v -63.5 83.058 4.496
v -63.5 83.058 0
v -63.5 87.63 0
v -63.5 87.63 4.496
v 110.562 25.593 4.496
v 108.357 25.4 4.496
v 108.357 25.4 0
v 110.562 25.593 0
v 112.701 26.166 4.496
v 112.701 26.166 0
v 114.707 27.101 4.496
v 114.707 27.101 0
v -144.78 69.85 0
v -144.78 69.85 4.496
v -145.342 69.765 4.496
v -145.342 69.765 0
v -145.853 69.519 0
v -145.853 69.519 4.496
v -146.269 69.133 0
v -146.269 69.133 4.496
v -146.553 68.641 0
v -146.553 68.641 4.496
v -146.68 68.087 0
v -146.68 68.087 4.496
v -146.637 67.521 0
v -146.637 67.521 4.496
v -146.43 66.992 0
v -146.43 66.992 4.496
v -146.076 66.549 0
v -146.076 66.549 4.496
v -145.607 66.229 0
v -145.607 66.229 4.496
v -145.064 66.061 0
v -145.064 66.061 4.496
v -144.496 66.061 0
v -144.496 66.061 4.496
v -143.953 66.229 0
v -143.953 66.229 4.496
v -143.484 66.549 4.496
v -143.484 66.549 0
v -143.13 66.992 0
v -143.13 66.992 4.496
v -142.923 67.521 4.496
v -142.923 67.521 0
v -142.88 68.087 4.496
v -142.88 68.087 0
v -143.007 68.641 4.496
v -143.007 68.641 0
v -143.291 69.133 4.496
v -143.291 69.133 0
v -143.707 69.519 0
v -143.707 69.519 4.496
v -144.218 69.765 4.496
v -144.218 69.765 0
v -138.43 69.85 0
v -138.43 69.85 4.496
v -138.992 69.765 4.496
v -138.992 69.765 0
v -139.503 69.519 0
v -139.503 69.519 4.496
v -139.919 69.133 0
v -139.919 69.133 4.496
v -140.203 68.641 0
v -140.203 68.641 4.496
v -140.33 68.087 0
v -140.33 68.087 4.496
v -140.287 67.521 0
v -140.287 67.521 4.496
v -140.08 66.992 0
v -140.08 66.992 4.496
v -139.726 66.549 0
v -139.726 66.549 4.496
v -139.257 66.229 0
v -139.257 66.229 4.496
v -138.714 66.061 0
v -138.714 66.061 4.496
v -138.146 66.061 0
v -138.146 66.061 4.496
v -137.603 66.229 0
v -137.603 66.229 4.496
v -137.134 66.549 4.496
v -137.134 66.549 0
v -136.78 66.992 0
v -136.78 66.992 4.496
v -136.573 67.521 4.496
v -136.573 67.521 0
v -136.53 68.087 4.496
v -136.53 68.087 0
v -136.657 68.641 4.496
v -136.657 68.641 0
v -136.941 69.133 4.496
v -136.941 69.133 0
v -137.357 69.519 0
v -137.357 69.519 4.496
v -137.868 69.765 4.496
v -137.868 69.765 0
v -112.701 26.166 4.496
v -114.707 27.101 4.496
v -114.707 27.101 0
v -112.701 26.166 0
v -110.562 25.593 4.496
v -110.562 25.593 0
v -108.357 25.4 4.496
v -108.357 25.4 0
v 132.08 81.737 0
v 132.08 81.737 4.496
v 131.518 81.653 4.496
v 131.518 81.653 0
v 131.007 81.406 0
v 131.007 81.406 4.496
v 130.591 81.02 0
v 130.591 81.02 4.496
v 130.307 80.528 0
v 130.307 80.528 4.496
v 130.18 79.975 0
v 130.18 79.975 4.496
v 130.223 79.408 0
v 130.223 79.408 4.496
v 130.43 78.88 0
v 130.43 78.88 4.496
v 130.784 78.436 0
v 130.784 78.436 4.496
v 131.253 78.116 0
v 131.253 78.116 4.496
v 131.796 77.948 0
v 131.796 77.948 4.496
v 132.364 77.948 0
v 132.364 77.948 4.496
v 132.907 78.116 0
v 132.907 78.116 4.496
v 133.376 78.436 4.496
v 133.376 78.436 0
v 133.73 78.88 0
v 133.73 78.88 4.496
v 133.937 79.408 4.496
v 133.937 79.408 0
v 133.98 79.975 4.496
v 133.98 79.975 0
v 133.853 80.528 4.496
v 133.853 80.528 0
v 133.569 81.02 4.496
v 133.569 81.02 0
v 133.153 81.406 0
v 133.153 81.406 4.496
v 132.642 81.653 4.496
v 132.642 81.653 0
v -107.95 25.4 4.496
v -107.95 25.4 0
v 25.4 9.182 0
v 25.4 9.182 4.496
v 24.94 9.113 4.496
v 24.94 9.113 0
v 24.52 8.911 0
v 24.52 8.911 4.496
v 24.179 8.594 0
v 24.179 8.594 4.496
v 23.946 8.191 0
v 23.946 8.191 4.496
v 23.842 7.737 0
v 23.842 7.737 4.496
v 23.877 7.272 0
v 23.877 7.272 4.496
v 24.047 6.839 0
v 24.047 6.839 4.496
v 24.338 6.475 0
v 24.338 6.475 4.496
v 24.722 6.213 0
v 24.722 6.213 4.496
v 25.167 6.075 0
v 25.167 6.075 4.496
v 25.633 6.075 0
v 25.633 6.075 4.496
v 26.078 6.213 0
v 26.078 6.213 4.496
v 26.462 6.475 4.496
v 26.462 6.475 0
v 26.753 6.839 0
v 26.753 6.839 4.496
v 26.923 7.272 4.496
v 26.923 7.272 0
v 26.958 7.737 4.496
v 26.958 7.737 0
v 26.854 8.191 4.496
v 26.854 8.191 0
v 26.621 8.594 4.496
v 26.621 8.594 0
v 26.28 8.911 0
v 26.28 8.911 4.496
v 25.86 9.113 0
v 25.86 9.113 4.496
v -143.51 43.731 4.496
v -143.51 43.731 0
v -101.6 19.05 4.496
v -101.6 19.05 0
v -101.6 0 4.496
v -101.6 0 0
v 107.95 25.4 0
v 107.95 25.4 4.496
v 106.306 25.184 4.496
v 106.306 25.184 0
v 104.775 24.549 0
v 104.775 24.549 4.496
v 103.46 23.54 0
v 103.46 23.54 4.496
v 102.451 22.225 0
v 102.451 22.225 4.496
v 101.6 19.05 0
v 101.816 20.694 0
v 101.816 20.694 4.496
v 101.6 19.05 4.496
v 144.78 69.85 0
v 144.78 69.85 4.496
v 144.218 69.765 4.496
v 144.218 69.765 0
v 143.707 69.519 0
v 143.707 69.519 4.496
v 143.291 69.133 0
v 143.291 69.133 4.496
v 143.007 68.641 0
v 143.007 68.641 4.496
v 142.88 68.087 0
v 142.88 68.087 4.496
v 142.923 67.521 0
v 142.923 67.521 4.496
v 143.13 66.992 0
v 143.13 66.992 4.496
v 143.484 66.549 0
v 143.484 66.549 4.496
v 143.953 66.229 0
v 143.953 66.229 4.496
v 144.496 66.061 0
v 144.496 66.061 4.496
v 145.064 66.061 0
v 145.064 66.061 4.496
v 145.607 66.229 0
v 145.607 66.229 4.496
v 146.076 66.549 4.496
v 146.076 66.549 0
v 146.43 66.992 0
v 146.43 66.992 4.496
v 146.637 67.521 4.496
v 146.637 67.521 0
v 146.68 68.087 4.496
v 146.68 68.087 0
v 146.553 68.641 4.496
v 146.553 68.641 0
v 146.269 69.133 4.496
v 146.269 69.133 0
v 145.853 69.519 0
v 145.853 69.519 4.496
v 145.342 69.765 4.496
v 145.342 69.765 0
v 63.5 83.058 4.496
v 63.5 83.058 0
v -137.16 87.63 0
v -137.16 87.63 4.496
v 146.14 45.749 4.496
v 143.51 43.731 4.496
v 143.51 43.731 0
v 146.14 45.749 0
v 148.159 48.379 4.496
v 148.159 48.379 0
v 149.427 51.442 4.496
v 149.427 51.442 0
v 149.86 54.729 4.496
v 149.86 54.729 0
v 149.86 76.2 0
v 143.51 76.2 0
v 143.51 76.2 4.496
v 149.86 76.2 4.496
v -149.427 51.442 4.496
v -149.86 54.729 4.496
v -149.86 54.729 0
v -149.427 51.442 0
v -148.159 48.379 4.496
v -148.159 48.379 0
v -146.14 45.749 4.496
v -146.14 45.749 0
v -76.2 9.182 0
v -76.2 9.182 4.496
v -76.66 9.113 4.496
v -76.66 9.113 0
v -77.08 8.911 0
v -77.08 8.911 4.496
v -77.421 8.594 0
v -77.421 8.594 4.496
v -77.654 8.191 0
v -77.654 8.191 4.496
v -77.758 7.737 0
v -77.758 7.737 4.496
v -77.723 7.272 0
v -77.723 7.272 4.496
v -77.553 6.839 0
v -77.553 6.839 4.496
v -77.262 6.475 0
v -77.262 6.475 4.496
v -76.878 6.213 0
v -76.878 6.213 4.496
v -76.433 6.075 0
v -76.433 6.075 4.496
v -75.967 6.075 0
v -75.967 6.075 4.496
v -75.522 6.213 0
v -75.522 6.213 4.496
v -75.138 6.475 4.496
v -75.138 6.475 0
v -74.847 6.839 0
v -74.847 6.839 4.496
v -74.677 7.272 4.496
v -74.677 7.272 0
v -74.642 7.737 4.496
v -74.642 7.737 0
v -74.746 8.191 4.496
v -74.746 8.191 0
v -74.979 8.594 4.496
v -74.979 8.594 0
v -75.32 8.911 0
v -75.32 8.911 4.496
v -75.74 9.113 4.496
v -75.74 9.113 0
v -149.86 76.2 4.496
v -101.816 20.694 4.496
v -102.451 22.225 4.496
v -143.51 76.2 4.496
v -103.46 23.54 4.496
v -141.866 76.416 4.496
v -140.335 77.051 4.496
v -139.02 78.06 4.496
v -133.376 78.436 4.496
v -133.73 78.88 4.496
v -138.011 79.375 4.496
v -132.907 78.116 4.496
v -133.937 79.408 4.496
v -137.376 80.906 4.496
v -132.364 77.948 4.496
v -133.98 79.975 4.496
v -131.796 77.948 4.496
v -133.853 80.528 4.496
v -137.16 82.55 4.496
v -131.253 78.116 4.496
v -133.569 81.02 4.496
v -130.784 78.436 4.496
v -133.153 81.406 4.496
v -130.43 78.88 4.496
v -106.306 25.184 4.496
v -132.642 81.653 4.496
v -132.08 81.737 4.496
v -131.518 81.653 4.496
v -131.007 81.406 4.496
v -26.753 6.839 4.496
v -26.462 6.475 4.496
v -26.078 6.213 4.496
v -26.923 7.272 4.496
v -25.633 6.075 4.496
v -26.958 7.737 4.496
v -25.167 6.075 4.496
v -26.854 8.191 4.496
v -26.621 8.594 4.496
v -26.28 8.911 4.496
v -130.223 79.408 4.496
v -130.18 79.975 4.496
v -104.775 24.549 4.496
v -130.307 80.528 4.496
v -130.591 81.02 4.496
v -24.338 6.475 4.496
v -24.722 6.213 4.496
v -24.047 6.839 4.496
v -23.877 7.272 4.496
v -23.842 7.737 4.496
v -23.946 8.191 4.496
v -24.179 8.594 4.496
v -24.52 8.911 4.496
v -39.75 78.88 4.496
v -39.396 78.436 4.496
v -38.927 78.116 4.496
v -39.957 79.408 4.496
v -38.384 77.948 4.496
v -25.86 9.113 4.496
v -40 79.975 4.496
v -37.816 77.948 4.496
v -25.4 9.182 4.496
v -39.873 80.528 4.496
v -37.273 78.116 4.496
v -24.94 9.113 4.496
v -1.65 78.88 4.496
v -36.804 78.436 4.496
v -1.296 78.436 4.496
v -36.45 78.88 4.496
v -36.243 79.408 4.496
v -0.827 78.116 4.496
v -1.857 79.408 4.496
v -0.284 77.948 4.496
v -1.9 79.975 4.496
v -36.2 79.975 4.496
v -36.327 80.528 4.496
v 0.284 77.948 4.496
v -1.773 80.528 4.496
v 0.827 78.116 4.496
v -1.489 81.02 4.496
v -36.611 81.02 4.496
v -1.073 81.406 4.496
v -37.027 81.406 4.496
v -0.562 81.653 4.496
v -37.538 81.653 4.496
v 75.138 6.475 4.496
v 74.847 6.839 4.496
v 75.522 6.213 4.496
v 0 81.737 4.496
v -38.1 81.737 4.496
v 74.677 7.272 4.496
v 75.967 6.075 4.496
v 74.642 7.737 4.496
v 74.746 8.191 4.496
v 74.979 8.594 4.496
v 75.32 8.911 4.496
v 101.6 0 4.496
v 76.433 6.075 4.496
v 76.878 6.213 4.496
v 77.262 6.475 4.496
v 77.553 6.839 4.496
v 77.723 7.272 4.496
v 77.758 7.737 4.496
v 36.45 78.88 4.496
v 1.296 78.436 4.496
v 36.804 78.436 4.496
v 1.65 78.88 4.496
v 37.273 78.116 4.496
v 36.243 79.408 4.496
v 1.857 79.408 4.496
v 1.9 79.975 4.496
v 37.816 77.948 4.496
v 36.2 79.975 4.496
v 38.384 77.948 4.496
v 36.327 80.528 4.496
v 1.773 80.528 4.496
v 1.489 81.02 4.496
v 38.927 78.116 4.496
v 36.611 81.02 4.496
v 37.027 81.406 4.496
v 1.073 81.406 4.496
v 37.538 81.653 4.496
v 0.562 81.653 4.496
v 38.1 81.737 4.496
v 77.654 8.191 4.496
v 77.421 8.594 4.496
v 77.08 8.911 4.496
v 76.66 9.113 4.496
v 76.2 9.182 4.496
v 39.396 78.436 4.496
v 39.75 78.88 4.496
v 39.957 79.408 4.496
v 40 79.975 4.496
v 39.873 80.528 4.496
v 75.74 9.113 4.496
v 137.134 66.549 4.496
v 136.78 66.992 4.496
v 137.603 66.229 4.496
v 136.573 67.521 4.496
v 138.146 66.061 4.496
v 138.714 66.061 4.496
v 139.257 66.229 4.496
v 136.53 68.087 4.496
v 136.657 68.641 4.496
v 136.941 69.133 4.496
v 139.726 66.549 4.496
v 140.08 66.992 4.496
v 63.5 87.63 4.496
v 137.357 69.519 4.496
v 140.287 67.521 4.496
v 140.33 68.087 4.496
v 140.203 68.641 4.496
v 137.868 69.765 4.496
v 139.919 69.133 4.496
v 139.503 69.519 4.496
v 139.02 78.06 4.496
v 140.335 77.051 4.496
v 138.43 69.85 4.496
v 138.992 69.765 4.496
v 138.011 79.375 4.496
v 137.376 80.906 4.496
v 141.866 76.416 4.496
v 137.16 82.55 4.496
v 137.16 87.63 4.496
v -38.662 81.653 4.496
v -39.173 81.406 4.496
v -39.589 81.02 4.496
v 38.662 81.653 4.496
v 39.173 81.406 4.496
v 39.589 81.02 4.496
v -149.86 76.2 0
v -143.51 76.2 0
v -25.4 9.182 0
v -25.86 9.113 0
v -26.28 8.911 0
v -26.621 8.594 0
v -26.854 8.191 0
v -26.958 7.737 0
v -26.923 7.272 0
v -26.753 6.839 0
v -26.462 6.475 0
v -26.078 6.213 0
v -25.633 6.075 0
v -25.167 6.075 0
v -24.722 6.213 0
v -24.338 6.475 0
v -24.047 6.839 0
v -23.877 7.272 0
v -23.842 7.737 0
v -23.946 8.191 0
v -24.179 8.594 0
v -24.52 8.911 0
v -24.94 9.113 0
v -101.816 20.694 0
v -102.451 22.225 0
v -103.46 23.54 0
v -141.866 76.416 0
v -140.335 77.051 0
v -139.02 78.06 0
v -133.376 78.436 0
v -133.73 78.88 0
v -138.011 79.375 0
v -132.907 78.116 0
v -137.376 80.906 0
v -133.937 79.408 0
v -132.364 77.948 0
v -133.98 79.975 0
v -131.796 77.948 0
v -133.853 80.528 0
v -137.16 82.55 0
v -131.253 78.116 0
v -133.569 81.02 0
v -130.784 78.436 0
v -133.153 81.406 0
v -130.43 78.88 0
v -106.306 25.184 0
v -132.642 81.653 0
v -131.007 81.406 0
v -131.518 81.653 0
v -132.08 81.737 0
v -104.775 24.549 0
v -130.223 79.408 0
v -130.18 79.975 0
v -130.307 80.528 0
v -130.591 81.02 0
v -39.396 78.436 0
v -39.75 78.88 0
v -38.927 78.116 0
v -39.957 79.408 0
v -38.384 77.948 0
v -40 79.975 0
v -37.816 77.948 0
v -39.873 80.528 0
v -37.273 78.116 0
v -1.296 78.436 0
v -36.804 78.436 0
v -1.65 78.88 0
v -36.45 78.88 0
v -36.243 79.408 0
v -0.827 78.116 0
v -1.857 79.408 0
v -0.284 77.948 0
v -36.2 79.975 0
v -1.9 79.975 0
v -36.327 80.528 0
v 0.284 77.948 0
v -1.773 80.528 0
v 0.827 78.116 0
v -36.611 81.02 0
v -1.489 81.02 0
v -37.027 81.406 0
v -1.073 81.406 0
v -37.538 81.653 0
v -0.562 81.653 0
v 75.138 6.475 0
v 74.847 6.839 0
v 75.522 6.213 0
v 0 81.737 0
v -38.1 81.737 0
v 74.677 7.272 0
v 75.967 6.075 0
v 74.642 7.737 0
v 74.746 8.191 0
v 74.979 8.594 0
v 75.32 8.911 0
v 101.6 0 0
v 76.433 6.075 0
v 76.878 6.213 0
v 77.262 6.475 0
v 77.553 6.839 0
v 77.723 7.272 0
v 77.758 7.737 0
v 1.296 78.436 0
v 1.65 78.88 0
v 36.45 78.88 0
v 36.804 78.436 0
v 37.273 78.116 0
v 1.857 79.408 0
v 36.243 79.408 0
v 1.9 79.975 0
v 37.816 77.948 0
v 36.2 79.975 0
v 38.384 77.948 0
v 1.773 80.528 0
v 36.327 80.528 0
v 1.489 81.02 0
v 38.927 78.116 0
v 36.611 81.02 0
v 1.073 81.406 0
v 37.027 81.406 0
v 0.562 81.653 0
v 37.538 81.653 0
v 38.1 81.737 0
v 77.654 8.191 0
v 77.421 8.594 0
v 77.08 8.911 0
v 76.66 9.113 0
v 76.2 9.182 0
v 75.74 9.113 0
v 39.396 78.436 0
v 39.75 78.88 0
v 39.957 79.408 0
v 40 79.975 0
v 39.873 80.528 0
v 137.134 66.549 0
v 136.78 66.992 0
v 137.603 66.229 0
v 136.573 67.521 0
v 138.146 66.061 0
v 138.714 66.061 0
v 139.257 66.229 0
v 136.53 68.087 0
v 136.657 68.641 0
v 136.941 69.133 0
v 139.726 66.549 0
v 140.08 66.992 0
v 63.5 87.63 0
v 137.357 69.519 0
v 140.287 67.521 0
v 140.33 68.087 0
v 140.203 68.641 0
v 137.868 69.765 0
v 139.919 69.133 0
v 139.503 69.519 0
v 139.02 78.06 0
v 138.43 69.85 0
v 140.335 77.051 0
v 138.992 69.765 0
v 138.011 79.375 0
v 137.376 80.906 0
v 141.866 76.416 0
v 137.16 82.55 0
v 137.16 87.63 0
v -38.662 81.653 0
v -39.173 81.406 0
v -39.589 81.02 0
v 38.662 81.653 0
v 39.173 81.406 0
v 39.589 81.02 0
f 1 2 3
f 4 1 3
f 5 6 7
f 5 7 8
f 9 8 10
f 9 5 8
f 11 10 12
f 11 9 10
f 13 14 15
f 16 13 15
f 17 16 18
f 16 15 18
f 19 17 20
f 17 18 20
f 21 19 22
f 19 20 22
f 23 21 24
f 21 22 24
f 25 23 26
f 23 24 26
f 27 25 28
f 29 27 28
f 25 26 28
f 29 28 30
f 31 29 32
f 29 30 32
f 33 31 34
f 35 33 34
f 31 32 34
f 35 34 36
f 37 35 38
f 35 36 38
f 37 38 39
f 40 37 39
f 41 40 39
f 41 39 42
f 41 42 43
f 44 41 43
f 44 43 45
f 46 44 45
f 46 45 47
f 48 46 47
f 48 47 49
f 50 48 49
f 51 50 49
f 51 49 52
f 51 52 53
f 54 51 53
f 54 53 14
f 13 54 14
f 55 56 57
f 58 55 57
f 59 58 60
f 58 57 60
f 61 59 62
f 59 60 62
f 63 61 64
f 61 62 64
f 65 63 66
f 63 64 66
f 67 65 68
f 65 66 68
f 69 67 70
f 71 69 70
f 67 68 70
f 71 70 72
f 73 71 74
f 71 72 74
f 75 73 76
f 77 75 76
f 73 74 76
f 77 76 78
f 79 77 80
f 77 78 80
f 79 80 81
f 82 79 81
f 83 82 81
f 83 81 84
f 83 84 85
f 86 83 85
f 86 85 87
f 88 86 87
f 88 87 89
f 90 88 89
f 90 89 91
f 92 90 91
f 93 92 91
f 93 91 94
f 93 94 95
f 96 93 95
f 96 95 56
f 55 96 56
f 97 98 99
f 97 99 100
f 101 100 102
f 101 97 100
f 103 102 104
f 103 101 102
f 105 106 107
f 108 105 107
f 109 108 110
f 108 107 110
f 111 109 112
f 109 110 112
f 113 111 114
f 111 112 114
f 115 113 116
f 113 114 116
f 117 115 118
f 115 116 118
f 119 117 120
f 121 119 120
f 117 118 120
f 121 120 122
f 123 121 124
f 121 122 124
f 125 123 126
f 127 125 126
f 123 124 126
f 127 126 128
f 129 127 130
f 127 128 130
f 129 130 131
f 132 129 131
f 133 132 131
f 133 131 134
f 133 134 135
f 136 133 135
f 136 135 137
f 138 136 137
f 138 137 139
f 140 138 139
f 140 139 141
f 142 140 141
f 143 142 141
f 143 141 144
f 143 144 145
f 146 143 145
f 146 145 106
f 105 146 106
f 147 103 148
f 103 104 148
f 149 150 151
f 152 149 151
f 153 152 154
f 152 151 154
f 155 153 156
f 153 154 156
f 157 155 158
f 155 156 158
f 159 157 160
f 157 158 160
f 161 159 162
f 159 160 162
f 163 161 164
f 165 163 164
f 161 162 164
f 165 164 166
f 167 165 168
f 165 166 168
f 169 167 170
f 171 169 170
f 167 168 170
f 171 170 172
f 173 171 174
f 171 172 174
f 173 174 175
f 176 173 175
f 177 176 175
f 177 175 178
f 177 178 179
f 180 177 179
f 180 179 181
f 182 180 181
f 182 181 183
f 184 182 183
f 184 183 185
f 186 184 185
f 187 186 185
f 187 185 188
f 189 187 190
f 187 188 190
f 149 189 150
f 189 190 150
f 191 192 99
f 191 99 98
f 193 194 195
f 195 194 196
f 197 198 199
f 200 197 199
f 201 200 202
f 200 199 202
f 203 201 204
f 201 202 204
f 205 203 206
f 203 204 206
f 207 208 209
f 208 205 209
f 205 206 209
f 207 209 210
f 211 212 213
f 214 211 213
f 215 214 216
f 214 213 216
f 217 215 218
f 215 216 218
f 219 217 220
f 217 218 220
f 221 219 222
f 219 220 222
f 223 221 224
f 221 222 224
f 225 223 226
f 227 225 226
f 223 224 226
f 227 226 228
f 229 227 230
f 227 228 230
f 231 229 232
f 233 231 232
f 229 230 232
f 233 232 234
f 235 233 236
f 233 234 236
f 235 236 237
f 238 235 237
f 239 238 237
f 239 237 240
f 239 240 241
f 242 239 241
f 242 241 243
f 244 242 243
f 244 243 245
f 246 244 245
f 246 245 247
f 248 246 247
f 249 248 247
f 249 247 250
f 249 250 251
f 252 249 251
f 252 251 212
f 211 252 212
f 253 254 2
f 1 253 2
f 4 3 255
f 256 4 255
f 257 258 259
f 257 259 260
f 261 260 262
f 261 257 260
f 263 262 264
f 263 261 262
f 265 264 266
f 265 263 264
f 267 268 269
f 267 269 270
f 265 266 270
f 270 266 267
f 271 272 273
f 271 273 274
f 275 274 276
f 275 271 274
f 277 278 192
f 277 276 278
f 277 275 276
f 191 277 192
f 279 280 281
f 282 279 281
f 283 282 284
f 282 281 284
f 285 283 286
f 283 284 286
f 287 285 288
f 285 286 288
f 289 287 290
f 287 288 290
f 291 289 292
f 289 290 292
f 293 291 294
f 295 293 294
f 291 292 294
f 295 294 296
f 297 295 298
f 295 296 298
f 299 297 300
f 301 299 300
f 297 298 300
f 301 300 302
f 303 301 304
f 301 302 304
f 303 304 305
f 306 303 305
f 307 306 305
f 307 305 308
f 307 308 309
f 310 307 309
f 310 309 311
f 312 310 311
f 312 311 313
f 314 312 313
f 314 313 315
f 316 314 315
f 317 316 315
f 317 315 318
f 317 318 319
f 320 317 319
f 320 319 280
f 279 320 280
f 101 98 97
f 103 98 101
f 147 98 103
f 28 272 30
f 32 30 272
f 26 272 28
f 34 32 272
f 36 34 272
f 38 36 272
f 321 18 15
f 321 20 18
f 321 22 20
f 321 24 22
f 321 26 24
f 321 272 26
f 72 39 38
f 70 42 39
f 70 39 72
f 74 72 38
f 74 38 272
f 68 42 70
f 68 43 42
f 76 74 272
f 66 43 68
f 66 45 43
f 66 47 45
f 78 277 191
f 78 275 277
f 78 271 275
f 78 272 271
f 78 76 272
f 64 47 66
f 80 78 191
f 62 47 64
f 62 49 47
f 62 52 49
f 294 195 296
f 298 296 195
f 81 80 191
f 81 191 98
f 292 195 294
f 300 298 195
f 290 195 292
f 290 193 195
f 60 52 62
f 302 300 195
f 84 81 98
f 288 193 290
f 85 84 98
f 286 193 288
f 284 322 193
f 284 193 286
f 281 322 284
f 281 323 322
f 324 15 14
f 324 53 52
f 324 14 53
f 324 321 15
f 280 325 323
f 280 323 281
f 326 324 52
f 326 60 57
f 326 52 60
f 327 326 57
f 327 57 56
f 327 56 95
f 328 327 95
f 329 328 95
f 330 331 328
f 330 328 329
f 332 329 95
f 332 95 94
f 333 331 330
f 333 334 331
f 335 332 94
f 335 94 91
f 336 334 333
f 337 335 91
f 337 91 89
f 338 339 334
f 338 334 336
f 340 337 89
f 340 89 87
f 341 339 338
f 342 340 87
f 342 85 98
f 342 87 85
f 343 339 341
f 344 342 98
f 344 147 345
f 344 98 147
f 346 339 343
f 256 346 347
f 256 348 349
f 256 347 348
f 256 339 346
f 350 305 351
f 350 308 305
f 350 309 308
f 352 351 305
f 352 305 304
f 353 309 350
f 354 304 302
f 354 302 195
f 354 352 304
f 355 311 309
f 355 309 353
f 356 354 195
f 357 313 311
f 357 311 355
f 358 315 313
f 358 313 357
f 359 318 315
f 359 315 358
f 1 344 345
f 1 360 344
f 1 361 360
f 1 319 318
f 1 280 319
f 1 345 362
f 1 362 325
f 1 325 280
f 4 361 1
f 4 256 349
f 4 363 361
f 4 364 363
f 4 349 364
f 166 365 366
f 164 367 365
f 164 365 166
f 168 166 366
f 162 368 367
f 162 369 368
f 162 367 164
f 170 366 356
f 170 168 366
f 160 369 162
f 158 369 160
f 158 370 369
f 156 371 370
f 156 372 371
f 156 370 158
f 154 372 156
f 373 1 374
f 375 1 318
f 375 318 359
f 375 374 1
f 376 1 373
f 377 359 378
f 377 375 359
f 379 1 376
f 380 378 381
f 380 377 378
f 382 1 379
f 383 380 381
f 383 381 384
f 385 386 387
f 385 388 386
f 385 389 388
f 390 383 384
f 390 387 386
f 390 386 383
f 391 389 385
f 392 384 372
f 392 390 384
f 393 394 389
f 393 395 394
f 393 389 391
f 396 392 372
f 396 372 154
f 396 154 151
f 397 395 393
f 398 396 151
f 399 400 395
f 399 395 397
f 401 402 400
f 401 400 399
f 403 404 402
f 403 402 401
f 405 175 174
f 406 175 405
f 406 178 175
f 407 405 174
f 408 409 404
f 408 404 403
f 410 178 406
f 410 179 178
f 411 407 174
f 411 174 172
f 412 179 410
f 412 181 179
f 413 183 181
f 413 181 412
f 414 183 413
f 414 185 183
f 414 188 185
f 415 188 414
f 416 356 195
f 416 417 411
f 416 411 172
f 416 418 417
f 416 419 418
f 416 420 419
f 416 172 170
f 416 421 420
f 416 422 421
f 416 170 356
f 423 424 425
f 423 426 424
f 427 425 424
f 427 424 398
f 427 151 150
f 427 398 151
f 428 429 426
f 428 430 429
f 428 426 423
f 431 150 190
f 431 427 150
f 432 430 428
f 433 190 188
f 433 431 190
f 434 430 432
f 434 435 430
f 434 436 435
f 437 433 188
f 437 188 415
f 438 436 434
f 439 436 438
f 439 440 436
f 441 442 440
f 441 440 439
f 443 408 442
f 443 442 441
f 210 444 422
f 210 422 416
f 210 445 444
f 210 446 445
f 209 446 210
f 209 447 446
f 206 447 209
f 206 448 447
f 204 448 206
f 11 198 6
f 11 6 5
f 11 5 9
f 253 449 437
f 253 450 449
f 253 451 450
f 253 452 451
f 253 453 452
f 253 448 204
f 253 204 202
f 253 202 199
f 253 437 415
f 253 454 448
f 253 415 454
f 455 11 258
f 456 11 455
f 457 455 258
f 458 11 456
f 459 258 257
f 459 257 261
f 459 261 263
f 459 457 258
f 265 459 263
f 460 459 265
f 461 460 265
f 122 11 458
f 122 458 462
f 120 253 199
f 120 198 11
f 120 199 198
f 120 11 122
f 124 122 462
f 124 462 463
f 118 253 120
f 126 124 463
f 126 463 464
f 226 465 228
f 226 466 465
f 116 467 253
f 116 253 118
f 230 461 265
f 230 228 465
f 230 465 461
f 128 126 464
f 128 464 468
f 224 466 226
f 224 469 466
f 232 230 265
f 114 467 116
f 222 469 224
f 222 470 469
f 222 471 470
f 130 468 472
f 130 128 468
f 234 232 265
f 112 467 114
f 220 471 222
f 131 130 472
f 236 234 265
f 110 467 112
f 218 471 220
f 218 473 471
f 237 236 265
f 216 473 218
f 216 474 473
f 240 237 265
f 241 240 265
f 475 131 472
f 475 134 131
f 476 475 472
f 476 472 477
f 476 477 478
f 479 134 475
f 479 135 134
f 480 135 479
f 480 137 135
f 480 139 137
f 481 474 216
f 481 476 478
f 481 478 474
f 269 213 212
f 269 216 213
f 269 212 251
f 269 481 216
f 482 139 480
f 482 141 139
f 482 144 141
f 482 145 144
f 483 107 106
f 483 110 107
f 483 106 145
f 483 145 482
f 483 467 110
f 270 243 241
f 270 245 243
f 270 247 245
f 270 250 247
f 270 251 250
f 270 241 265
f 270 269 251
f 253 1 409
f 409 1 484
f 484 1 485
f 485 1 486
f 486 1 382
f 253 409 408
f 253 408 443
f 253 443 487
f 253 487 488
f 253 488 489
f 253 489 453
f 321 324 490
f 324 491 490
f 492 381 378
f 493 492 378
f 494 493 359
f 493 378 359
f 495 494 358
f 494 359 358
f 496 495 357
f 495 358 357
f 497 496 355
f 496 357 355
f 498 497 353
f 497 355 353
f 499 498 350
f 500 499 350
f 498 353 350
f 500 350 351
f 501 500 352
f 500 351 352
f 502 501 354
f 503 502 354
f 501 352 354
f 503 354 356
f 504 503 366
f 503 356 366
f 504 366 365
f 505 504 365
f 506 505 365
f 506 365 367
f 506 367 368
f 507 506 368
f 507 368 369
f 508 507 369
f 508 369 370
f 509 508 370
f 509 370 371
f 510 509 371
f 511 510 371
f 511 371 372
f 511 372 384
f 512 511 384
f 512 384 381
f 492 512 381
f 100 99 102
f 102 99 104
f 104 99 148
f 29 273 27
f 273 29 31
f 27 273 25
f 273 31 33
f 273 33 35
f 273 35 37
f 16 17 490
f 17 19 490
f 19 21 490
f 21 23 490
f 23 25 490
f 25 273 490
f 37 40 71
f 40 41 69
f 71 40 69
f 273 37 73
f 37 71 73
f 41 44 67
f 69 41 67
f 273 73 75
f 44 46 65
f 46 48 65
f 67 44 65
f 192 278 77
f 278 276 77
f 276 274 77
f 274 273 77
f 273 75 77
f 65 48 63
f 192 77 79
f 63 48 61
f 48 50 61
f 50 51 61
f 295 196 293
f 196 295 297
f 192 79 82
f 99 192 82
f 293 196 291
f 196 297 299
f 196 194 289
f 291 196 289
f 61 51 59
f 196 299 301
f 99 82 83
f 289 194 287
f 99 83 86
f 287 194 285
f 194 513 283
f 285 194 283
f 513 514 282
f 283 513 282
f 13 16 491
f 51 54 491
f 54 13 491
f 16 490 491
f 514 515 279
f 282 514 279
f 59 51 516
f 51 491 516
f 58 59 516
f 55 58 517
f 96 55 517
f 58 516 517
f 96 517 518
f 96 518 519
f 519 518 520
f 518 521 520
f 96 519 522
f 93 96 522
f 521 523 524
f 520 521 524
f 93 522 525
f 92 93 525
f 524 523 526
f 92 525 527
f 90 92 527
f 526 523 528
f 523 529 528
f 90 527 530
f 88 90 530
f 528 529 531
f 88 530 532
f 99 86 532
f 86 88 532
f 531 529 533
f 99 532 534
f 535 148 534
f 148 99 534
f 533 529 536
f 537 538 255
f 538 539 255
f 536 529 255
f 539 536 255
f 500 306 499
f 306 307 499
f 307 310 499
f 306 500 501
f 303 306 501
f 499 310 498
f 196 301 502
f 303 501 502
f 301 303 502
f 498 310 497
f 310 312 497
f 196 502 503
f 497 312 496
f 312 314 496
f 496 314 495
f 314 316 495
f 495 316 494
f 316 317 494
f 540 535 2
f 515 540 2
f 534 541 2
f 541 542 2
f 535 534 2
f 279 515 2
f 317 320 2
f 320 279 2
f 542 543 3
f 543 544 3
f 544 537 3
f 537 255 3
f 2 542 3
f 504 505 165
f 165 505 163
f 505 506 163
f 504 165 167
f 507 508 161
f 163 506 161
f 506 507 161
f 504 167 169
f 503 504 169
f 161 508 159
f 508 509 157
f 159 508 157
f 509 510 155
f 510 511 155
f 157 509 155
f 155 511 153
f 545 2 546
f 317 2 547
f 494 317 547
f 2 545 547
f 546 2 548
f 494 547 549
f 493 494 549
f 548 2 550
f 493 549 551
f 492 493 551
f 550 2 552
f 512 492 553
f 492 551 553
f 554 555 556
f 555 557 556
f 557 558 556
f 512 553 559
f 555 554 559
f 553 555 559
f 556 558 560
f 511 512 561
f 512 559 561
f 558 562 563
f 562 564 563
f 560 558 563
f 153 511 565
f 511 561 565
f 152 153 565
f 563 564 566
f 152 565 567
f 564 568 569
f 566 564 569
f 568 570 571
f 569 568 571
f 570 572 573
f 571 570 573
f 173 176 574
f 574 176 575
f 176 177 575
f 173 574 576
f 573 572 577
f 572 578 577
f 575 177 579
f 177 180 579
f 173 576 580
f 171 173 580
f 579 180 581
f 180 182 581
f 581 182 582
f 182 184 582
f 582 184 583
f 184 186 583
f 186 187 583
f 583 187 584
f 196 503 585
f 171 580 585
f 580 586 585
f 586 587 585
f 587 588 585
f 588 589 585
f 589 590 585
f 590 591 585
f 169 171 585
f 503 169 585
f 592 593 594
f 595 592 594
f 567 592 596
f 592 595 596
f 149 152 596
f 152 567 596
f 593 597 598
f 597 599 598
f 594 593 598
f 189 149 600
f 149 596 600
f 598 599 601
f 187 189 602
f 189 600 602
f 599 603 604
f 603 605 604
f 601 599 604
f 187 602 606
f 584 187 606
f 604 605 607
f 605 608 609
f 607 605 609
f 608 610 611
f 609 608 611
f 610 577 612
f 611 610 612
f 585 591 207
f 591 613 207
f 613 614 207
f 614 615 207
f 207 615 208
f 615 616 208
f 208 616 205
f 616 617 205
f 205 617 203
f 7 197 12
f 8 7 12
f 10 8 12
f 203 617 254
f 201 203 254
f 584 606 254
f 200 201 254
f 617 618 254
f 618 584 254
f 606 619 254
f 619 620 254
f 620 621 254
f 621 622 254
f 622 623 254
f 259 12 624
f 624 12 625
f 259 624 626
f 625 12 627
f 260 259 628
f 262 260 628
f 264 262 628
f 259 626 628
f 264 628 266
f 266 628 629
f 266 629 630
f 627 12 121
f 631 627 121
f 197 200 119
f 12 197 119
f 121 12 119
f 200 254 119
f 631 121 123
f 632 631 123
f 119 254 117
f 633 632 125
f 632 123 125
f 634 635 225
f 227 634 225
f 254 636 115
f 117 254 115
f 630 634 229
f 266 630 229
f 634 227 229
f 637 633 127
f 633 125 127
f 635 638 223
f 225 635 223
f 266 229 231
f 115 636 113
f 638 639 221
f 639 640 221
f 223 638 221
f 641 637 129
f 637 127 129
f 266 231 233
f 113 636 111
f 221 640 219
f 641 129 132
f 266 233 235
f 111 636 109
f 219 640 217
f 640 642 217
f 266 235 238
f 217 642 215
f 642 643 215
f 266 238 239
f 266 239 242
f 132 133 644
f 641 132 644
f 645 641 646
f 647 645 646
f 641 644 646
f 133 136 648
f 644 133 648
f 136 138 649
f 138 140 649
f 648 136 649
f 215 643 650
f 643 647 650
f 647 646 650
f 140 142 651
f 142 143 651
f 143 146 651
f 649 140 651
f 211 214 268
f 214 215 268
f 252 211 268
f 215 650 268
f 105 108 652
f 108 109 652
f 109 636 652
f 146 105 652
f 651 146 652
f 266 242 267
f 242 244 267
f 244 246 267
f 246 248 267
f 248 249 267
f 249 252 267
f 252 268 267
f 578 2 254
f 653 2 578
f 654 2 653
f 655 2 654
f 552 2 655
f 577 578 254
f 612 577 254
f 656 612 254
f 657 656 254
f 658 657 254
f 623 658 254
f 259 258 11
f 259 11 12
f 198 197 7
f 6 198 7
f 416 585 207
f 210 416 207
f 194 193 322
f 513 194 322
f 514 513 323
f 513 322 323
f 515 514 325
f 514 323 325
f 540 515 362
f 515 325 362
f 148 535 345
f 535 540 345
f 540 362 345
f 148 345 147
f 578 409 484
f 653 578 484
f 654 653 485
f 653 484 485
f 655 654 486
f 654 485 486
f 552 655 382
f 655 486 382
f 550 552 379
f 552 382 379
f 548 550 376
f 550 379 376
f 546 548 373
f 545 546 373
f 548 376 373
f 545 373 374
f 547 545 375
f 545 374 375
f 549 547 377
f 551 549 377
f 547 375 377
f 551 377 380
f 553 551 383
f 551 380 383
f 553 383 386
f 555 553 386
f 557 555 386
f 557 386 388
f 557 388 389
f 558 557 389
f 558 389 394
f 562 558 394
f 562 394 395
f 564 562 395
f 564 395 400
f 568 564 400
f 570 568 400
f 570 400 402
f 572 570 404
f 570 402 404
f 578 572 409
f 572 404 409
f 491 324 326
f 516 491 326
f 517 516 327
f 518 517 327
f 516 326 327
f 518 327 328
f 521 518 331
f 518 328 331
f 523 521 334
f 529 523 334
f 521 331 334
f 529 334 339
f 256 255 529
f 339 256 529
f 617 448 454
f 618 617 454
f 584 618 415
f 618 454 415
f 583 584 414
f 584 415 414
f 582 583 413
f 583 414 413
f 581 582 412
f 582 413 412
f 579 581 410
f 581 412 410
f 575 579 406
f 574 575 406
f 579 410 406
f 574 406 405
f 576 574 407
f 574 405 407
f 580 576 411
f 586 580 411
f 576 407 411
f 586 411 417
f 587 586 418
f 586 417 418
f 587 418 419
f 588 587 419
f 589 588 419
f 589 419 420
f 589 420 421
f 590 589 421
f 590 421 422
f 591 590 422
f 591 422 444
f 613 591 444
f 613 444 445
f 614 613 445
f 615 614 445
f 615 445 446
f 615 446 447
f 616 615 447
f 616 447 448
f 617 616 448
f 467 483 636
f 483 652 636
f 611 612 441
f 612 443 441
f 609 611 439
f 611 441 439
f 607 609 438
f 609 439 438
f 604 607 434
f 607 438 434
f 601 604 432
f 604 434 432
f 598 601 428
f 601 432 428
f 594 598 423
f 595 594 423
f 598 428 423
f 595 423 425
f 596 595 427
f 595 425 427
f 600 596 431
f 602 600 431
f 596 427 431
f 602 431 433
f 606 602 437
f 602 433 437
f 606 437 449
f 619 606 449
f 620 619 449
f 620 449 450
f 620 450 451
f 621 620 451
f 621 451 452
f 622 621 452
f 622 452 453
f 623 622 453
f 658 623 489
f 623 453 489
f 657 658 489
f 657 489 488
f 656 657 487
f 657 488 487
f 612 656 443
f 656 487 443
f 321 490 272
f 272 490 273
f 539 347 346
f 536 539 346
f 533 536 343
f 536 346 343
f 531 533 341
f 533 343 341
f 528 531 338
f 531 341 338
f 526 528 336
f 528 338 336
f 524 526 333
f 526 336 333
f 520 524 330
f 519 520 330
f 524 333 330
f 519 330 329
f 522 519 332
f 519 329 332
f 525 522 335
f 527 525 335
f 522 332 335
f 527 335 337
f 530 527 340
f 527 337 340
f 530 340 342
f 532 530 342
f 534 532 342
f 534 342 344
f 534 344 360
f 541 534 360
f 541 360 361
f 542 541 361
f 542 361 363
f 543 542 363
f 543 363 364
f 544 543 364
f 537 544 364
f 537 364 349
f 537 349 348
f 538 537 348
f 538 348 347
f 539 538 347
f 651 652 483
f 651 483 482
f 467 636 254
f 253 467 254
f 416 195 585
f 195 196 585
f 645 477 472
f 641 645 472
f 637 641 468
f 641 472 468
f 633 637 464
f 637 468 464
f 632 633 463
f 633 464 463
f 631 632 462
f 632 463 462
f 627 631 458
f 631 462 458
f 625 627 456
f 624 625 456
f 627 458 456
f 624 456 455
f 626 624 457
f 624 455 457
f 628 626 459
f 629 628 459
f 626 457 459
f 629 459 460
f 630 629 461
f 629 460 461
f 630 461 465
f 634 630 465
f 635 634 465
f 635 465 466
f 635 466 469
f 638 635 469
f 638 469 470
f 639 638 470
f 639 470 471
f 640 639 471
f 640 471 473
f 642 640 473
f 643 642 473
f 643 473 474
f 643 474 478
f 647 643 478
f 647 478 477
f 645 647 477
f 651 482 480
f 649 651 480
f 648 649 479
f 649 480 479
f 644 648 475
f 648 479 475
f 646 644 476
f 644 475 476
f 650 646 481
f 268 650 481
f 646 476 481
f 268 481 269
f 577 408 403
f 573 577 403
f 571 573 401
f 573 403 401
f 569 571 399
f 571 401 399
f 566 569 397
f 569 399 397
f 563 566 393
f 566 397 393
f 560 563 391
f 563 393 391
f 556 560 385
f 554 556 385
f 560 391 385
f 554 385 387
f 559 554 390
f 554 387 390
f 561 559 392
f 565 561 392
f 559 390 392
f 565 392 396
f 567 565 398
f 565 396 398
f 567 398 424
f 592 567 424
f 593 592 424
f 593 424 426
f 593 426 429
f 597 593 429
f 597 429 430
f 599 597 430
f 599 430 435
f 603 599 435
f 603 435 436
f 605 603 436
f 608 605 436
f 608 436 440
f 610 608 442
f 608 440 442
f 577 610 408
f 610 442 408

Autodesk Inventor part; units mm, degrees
ref_plane "YZ Plane" through (0, 0, 0) normal (1, 0, 0) x (0, 1, 0)
ref_plane "XZ Plane" through (0, 0, 0) normal (0, 1, 0) x (-1, 0, 0)
ref_plane "XY Plane" through (0, 0, 0) normal (0, 0, 1) x (1, 0, 0)
sketch "Sketch1" plane through (0, 0, 0) normal (0, 0, 1) x (1, 0, 0)
  line L0 (0, 105.156) -> (0, -17.526) projected
  line L1 (-209.804, 0) -> (209.804, 0) projected
  line L2 (101.6, 25.4) -> (-101.6, 25.4)
  line L3 (-101.6, 25.4) -> (-101.6, 0)
  line L4 (-101.6, 0) -> (101.6, 0)
  line L5 (101.6, 0) -> (101.6, 25.4)
  line L6 (101.6, 25.4) -> (-101.6, 0) construction
  line L7 (-101.6, 25.4) -> (101.6, 0) construction
  line L8 (149.86, 87.63) -> (-149.86, 87.63)
  line L9 (-149.86, 87.63) -> (-149.86, 25.4)
  line L10 (-149.86, 25.4) -> (149.86, 25.4)
  line L11 (149.86, 25.4) -> (149.86, 87.63)
  line L12 (149.86, 87.63) -> (-149.86, 25.4) construction
  line L13 (-149.86, 87.63) -> (149.86, 25.4) construction
  point P0 (0, 0)
  point P1 (0, 12.7)
  point P2 (0, 56.515)
  point P3 (-76.2, 7.62)
  point P4 (-25.4, 7.62)
  point P5 (25.4, 7.62)
  point P6 (76.2, 7.62)
  point P7 (-132.08, 79.8322)
  point P8 (132.08, 79.8322)
  point P9 (0, 79.8322)
  point P10 (-38.1, 79.8322)
  point P11 (38.1, 79.8322)
  dimension "d0" = 203.2
  dimension "d1" = 25.4
  dimension "d2" = 0
  dimension "d5" = 25.4
  dimension "d6" = 50.8
  dimension "d7" = 7.62
  dimension "d8" = 25.4
  dimension "d9" = 50.8
  dimension "d30" = 132.08
  dimension "d31" = 132.08
  dimension "d32" = 79.8322
  dimension "d33" = 87.63
  dimension "d34" = 299.72
  dimension "d62" = 38.1
  dimension "d63" = 38.1
extrude "Extrusion1" add sketch "Sketch1" along normal blind 4.4958
hole "Hole1" at (-76.2, 7.62, 0) at (-25.4, 7.62, 0) at (25.4, 7.62, 0) at (76.2, 7.62, 0) direction (0, 0, 1) diameter 3.1242 end through all
hole "Hole2" at (-132.08, 79.8322, 0) at (132.08, 79.8322, 0) at (0, 79.8322, 0) at (-38.1, 79.8322, 0) at (38.1, 79.8322, 0) direction (0, 0, 1) diameter 3.81 end through all clearance for "Socket Head Cap Screw" size "#6" standard "Ansi Unified Screw Threads"
sketch "Sketch2" plane through (0, 0, 0) normal (0, 0, 1) x (1, 0, 0)
  circle A0 centre (132.08, 79.8322) radius 1.905 projected
  circle A1 centre (-132.08, 79.8322) radius 1.905 projected
  circle A2 centre (0, 79.8322) radius 1.905 projected
  circle A3 centre (25.4, 7.62) radius 1.5621 projected
  circle A4 centre (-76.2, 7.62) radius 1.5621 projected
  circle A5 centre (-25.4, 7.62) radius 1.5621 projected
  circle A6 centre (76.2, 7.62) radius 1.5621 projected
  line L0 (-101.6, 25.4) -> (-101.6, 0) projected
  line L1 (-101.6, 0) -> (101.6, 0) projected
  line L2 (101.6, 0) -> (101.6, 25.4) projected
  line L3 (101.6, 25.4) -> (149.86, 25.4) projected
  line L4 (149.86, 25.4) -> (149.86, 87.63) projected
  line L5 (149.86, 87.63) -> (-149.86, 87.63) projected
  line L6 (-149.86, 87.63) -> (-149.86, 25.4) projected
  line L7 (-149.86, 25.4) -> (-101.6, 25.4) projected
  line L8 (-149.86, 87.63) -> (-137.16, 87.63)
  line L9 (-137.16, 87.63) -> (-137.16, 76.2)
  line L10 (-137.16, 76.2) -> (-149.86, 76.2)
  line L11 (-149.86, 76.2) -> (-149.86, 87.63)
  line L12 (149.86, 87.63) -> (137.16, 87.63)
  line L13 (137.16, 87.63) -> (137.16, 76.2)
  line L14 (137.16, 76.2) -> (149.86, 76.2)
  line L15 (149.86, 76.2) -> (149.86, 87.63)
  line L16 (-149.86, 87.63) -> (-149.2523, 87.63)
  line L17 (-149.2523, 87.63) -> (-151.5626, 87.63)
  line L18 (-151.5626, 87.63) -> (-149.86, 87.63)
  point P0 (0, 0)
  point P1 (-144.78, 67.945)
  point P2 (144.78, 67.945)
  point P3 (-138.43, 67.945)
  point P4 (138.43, 67.945)
  dimension "d35" = 11.43
  dimension "d36" = 12.7
  dimension "d39" = 8.255
  dimension "d40" = 5.08
  dimension "d41" = 5.08
  dimension "d64" = 6.35
  dimension "d65" = 6.35
extrude "Extrusion2" cut sketch "Sketch2" along normal up to next contours L6 L5 L9 L10 | L14 L13 L5 L4
hole "Hole3" at (-144.78, 67.945, 0) at (144.78, 67.945, 0) at (-138.43, 67.945, 0) at (138.43, 67.945, 0) direction (0, 0, 1) diameter 3.81 end through all clearance for "Socket Head Cap Screw" size "#6" standard "Ansi Unified Screw Threads"
sketch "Sketch3" plane through (0, 0, 0) normal (0, 0, 1) x (1, 0, 0)
  line L0 (0, 105.156) -> (0, -17.526) projected
  line L1 (-209.804, 0) -> (209.804, 0) projected
  line L2 (137.16, 87.63) -> (-137.16, 87.63) projected
  line L3 (63.5, 83.058) -> (-63.5, 83.058)
  line L4 (-63.5, 83.058) -> (-63.5, 87.63)
  line L5 (-63.5, 87.63) -> (63.5, 87.63)
  line L6 (63.5, 87.63) -> (63.5, 83.058)
  line L7 (63.5, 83.058) -> (-63.5, 87.63) construction
  line L8 (-63.5, 83.058) -> (63.5, 87.63) construction
  point P0 (0, 0)
  point P1 (0, 85.344)
  dimension "d49" = 4.572
  dimension "d50" = 127
extrude "Extrusion3" cut sketch "Sketch3" along normal up to next
fillet "Fillet1" radius 6.35 2 edges at (-137.16, 76.2, 2.2479) (137.16, 76.2, 2.2479)
chamfer "Chamfer1" distance 38.1 angle 30 1 edges at (149.86, 25.4, 2.2479) measured on face at (117.6867, 25.4, 1.4986)
chamfer "Chamfer2" distance 38.1 angle 30 1 edges at (-149.86, 25.4, 2.2479) measured on face at (-133.7733, 25.4, 1.4986)
fillet "Fillet2" radius 12.7 4 edges at (-149.86, 47.397, 2.2479) (-111.76, 25.4, 2.2479) (111.76, 25.4, 2.2479) (149.86, 47.397, 2.2479)
fillet "Fillet3" radius 6.35 2 edges at (-101.6, 25.4, 2.2479) (101.6, 25.4, 2.2479)
properties material "DELRIN 100, BLACK (EXTRUDED)"
